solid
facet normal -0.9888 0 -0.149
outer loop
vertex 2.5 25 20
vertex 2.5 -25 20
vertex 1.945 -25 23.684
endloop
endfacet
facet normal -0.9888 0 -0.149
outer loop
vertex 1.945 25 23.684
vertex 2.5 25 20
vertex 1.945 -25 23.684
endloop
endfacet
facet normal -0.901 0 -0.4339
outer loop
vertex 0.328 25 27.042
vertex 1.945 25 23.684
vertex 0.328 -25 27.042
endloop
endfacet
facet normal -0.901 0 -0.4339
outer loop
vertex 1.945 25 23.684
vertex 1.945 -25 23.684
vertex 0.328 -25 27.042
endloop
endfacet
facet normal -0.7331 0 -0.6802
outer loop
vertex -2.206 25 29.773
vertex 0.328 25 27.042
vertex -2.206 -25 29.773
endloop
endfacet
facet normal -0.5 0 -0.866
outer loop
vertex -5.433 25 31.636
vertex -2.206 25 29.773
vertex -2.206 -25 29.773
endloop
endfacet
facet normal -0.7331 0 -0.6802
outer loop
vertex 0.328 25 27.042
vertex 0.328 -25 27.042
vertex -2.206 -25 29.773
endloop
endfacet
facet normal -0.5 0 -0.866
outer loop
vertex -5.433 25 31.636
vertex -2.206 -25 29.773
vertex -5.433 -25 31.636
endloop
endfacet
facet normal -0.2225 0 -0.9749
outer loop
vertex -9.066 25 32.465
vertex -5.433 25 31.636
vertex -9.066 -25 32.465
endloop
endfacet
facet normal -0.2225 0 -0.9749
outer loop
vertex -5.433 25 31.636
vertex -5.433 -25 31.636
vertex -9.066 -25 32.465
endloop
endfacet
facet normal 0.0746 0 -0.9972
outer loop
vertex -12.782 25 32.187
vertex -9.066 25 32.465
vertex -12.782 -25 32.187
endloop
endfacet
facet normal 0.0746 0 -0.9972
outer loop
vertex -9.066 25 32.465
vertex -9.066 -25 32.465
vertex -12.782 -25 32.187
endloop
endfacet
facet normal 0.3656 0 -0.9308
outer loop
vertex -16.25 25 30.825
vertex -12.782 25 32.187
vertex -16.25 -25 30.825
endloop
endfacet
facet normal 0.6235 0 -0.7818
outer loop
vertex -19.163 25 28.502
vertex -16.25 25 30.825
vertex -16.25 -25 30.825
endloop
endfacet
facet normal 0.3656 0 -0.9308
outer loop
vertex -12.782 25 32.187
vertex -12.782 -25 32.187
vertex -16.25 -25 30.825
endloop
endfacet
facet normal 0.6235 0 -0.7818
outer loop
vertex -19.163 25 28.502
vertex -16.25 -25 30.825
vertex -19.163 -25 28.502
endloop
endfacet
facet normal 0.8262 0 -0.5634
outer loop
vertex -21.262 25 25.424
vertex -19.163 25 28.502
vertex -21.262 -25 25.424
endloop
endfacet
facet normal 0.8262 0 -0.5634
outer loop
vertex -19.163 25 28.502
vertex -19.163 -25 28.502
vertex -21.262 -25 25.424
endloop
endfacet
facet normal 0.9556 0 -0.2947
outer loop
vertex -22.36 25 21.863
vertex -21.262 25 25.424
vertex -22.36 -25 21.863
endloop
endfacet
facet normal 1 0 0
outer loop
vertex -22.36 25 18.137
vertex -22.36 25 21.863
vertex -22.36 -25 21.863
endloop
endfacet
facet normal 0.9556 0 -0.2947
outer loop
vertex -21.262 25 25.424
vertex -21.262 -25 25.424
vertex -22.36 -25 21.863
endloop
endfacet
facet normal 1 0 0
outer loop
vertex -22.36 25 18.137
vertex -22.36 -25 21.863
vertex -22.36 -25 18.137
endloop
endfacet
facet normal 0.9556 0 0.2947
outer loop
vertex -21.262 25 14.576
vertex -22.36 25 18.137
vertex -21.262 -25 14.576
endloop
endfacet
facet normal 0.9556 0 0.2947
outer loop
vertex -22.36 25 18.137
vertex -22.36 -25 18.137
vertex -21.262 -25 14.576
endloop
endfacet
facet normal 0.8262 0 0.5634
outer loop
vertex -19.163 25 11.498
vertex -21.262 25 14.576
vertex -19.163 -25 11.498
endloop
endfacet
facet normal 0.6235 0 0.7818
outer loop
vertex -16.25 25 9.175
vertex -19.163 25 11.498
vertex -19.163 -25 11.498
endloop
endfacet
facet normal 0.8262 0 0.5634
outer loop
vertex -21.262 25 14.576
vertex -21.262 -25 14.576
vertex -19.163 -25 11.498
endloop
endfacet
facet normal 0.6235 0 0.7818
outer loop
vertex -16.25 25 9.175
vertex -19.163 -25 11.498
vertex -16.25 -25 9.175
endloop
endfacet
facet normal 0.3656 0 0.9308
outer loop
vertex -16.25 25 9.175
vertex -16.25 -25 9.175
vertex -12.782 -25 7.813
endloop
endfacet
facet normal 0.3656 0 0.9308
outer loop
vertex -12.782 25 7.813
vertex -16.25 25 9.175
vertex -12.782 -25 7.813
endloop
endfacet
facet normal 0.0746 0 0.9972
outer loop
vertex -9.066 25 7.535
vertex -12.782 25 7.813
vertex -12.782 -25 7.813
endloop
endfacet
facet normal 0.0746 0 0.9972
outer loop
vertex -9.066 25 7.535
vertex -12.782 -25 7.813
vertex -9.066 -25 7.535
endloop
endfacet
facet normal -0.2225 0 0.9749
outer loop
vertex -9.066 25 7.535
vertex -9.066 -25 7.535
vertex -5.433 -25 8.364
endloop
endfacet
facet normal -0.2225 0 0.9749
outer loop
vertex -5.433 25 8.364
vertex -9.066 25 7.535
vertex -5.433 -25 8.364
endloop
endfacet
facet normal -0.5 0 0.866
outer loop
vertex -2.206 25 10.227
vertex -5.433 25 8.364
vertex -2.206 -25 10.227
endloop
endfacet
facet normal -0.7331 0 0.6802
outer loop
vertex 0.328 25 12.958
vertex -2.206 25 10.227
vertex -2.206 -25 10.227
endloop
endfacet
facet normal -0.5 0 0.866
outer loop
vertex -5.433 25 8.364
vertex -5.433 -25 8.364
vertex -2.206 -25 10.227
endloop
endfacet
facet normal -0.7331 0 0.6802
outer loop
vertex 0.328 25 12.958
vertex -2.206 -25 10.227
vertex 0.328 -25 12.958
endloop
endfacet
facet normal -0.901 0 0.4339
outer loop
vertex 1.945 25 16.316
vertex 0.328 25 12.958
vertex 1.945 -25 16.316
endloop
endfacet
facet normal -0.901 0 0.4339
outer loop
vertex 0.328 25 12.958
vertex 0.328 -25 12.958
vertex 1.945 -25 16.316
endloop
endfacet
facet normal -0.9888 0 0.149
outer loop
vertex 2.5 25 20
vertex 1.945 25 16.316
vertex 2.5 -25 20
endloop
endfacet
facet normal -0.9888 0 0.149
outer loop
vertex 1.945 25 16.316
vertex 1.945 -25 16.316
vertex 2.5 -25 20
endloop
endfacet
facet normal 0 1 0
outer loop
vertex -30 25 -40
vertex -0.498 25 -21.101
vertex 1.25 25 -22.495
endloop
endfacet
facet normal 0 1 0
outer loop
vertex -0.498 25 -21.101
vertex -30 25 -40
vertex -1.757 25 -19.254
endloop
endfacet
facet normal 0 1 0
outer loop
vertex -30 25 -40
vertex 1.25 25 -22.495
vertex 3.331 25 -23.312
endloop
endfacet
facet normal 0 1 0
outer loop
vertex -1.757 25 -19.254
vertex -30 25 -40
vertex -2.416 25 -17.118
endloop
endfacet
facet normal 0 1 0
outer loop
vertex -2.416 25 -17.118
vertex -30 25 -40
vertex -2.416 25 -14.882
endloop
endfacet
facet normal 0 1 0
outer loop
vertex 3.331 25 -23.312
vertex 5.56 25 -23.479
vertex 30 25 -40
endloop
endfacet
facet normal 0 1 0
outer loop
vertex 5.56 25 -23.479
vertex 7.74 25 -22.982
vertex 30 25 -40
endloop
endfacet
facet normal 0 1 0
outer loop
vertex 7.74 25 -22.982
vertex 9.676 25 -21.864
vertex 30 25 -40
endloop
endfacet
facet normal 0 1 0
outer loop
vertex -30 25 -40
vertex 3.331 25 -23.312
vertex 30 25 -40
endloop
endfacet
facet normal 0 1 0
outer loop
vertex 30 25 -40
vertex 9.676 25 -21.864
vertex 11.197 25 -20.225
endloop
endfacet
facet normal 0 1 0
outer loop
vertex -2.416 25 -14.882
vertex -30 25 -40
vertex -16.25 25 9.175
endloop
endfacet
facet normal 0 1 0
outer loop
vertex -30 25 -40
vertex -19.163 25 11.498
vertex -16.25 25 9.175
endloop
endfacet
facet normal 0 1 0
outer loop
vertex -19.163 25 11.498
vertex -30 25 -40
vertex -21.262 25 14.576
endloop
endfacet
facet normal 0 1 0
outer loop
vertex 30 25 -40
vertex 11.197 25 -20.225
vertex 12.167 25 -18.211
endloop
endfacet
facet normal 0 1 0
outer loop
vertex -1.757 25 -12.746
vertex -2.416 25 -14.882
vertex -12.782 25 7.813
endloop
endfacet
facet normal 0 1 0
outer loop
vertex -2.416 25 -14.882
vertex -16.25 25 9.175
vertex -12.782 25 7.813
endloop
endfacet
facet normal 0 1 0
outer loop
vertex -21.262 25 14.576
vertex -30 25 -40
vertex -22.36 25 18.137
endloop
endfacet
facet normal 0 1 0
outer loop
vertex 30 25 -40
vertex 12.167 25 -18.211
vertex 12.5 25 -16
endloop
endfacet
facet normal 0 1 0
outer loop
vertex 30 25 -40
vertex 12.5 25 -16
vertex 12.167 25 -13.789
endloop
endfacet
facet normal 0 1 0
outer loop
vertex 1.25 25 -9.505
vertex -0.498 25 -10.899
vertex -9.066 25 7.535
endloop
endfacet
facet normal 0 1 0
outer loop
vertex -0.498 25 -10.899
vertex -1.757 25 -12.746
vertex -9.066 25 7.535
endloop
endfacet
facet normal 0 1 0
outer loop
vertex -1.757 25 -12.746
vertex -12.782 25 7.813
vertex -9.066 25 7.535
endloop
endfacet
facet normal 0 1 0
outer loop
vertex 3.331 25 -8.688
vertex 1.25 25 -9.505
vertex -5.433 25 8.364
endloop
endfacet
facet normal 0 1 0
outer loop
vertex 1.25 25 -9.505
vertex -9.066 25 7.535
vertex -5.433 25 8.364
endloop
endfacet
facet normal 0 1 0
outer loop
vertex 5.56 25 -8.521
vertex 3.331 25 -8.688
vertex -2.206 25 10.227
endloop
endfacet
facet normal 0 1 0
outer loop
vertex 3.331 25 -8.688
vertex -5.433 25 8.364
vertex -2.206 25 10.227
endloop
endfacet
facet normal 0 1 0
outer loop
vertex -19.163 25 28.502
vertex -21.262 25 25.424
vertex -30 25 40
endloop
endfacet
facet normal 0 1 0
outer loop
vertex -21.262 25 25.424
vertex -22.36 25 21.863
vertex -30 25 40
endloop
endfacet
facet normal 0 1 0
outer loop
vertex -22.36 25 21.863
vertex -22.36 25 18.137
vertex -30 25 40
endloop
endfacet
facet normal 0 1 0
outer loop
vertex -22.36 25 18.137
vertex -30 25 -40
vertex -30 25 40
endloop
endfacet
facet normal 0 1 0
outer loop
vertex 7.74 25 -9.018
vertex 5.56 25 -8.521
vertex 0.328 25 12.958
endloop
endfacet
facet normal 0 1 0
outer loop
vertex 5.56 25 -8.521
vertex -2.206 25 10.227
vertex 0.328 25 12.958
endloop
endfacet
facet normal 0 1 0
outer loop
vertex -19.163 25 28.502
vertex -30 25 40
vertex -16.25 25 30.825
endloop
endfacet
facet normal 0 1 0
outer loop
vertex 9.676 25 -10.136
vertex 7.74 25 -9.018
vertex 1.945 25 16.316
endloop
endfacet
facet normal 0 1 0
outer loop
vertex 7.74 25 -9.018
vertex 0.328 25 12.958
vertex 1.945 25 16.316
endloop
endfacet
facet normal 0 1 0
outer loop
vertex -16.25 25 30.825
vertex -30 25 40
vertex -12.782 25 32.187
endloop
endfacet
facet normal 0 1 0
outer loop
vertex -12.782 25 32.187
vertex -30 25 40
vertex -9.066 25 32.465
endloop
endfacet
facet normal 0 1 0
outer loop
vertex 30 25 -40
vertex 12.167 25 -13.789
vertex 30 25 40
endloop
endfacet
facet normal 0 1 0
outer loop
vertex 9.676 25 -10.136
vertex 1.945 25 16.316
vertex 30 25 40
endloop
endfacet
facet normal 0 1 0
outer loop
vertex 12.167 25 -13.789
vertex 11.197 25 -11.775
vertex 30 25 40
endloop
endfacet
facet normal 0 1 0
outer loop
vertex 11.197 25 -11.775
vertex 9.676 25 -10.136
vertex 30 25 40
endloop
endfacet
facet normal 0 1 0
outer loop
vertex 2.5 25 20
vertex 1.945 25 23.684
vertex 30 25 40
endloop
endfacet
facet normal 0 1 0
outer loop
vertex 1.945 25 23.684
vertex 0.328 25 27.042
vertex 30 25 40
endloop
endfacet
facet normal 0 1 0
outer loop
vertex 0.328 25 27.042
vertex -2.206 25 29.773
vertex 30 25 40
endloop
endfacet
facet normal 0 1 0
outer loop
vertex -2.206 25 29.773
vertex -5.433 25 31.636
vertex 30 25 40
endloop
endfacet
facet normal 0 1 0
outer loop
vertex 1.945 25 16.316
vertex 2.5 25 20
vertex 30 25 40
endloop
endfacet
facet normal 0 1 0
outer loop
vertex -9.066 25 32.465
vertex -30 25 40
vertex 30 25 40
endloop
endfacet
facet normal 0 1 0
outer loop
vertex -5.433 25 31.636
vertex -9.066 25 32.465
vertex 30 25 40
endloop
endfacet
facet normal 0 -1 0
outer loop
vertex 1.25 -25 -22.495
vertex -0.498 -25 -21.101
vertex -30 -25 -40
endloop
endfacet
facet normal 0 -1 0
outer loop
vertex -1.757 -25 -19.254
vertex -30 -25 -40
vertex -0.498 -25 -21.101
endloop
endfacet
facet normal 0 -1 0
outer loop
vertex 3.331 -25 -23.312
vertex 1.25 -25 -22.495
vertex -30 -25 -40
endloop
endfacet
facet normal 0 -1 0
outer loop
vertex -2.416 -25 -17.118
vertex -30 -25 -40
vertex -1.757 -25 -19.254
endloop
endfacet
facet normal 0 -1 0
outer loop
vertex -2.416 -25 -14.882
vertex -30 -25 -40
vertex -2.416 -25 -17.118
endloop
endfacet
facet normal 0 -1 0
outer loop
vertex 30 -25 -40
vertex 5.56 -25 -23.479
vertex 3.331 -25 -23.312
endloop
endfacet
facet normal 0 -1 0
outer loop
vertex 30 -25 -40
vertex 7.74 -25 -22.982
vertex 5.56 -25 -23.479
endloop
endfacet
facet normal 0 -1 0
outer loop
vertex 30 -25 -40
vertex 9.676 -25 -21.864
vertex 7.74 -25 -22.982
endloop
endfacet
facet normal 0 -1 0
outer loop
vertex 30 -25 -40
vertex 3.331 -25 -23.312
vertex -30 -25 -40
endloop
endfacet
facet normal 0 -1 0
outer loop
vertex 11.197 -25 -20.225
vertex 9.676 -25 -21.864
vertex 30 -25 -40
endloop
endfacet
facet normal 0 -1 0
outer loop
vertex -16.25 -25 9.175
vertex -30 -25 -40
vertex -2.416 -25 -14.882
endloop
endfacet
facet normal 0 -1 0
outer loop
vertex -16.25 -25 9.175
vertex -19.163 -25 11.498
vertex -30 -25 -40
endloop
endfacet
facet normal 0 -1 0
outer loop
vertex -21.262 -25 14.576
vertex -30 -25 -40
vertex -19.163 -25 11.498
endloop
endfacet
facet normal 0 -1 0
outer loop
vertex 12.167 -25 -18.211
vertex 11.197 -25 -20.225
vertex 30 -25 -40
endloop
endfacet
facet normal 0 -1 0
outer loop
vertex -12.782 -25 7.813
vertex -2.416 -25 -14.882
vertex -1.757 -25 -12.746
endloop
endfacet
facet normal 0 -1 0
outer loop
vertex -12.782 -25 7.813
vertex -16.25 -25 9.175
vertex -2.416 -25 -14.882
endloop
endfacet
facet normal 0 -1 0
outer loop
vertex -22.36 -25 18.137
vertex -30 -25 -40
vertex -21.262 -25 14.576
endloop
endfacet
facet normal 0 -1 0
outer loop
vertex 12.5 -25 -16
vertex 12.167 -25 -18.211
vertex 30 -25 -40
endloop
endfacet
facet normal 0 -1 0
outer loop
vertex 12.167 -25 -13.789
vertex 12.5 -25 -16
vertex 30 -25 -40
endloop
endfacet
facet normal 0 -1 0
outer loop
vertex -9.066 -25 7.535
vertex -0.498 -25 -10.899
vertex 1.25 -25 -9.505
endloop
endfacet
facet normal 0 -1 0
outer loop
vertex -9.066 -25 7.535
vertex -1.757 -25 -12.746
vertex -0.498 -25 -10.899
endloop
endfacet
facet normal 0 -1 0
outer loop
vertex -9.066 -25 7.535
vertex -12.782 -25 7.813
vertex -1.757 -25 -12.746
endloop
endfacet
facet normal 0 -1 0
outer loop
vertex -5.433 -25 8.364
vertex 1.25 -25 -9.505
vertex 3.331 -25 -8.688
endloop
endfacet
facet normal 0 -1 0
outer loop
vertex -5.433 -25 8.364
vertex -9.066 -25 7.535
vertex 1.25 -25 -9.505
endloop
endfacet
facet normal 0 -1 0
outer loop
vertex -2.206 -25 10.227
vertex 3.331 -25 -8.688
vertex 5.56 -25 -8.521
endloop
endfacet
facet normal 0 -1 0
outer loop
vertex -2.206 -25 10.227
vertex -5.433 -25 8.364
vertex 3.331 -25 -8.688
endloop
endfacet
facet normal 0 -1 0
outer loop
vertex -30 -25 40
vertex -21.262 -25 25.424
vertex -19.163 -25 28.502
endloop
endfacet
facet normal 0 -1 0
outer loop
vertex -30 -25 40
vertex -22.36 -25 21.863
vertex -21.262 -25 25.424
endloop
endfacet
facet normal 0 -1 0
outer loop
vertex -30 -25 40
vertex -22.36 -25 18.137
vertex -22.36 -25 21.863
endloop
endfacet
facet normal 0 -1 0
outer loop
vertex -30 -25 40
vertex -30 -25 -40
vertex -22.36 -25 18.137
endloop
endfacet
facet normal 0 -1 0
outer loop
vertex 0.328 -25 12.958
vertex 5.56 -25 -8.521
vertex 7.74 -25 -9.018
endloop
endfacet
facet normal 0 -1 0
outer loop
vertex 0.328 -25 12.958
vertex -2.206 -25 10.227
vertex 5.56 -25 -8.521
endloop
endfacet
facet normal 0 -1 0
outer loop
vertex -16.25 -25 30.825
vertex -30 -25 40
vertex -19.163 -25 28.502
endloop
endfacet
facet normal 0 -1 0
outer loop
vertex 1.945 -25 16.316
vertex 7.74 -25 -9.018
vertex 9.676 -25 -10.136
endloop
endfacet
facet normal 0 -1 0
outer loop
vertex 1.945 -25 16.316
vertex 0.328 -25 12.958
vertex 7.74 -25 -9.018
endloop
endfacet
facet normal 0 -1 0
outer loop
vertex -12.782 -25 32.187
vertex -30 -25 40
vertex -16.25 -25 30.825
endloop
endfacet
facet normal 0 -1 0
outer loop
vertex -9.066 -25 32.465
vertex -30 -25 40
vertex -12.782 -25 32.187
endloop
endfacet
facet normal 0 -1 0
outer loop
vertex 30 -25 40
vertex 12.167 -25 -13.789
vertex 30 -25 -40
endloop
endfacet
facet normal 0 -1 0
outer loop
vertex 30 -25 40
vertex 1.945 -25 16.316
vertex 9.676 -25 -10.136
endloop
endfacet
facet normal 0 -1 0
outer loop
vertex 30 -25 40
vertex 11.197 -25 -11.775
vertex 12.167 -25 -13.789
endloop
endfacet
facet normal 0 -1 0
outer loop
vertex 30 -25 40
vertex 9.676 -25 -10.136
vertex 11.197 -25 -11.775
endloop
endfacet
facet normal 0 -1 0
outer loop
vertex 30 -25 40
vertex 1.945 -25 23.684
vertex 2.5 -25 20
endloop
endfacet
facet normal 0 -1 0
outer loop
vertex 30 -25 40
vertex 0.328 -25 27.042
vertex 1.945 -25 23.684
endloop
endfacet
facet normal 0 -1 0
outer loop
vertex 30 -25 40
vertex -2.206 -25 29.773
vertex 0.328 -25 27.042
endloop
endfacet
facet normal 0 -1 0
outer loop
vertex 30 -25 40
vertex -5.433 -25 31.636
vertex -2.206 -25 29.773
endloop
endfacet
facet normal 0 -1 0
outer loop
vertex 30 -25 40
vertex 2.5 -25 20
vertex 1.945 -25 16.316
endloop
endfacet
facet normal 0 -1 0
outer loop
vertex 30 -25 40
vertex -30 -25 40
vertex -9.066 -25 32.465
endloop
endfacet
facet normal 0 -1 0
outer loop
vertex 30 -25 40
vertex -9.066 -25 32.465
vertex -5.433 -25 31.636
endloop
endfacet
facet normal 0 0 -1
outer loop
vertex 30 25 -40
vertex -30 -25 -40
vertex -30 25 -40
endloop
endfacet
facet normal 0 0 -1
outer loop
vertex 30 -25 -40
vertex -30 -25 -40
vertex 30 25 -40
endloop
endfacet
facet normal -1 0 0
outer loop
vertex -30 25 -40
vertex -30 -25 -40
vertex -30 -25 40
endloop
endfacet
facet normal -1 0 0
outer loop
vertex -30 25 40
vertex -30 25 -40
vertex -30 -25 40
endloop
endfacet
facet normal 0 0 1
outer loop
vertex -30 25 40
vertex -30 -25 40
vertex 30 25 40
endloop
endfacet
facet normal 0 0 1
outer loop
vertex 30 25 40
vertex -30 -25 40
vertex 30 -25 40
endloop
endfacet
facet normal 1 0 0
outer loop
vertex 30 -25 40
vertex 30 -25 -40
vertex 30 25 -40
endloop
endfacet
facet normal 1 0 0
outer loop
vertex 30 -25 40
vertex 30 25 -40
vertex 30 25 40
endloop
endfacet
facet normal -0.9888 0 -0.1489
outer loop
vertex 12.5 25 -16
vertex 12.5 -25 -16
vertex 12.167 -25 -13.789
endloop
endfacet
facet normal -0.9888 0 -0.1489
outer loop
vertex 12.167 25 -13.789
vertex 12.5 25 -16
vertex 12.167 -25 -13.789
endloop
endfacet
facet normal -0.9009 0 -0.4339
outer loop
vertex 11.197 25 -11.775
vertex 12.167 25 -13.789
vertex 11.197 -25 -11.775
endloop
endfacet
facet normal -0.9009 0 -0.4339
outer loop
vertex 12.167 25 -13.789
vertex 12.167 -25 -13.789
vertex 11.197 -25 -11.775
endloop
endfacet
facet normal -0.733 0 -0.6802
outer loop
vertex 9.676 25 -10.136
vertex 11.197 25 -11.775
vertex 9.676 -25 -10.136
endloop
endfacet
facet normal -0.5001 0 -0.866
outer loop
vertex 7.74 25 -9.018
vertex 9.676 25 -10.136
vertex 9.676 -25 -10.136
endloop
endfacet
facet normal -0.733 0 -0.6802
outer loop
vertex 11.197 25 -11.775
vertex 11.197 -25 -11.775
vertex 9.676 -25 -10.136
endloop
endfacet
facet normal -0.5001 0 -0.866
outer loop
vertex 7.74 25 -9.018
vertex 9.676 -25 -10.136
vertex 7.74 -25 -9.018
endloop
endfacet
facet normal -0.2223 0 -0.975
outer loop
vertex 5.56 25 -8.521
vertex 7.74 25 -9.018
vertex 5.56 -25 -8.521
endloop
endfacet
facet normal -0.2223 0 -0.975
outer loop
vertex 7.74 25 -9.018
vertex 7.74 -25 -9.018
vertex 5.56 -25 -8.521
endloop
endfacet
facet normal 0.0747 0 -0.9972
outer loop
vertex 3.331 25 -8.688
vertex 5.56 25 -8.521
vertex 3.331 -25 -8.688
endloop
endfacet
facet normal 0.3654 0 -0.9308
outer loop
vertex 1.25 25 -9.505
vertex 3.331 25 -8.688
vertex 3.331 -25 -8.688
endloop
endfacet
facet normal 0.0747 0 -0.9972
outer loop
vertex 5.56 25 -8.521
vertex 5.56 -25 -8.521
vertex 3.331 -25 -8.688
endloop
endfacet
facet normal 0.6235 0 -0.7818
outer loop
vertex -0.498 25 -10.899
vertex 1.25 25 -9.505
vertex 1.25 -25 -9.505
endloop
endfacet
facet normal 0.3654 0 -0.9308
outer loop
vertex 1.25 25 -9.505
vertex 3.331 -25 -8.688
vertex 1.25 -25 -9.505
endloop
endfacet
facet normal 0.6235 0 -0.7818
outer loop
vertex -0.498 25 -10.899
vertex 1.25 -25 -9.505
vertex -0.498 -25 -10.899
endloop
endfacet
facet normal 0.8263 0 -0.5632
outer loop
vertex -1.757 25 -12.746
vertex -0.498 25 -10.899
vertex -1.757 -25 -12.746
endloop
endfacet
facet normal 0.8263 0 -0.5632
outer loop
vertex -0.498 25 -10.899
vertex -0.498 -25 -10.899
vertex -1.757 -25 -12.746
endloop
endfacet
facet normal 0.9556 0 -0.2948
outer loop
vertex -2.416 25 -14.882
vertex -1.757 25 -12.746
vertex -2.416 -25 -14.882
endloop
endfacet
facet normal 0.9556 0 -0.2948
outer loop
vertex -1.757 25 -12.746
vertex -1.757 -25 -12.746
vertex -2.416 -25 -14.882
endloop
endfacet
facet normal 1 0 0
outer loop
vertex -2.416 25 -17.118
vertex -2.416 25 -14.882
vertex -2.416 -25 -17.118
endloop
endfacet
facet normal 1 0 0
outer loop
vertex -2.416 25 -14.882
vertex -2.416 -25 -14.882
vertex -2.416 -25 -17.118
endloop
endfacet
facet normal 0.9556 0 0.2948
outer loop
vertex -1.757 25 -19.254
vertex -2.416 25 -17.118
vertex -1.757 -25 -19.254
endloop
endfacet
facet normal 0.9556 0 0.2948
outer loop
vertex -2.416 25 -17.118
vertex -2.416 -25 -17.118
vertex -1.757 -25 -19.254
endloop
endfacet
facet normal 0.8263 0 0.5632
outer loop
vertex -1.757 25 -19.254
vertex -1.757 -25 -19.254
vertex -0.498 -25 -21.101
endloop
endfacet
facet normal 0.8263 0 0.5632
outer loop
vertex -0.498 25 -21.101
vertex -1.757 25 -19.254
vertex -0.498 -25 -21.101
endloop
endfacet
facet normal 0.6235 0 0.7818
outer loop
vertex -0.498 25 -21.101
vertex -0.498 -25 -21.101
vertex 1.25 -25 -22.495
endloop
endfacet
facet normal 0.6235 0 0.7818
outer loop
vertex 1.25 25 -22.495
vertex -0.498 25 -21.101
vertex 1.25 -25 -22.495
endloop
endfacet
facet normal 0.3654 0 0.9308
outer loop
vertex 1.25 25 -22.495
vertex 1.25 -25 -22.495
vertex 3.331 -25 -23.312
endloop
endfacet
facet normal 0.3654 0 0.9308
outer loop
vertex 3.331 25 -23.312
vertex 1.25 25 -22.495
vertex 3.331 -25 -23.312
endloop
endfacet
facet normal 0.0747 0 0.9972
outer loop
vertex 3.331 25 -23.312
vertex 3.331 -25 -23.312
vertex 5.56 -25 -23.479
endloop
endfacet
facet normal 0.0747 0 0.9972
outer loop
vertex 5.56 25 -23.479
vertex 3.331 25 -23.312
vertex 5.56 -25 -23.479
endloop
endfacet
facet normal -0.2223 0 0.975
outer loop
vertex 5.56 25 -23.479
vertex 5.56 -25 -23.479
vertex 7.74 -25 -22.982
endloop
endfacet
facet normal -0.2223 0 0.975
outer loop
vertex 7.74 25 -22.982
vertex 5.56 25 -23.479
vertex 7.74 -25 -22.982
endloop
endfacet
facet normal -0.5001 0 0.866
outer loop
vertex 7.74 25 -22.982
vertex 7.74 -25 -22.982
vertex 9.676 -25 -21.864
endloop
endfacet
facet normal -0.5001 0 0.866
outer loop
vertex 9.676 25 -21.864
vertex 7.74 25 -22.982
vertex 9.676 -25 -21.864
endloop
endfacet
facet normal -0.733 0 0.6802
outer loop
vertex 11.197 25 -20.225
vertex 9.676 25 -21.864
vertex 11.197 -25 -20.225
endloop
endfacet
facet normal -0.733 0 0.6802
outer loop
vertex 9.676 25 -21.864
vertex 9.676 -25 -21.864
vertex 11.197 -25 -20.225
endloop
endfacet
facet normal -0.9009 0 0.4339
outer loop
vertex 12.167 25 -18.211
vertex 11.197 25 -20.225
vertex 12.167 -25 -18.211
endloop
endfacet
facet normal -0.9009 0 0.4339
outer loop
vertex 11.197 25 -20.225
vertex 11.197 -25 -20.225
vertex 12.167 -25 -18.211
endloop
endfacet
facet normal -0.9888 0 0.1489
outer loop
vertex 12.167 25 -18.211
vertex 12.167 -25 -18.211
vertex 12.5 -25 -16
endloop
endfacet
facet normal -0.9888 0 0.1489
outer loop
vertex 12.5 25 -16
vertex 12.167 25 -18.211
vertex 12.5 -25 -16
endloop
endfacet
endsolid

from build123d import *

# Parameters (mm, degrees)
F0_W     = 60
F0_H     = 80
F1_DEPTH = 25
F2_R     = 12.5
F2_R_2   = 7.5
F3_DEPTH = 50


with BuildPart() as f1:
    # F0 (on Front) → F1 (new body, symmetric)
    with BuildSketch(Plane.XZ):
        Rectangle(F0_W, F0_H)
    extrude(amount=F1_DEPTH, both=True)

    # F2 (on face) → F3 (cut, through all)
    with BuildSketch(Plane.XZ.offset(25)):
        with Locations((-10, 20)):
            Circle(F2_R)
        with Locations((5, -16)):
            Circle(F2_R_2)
    extrude(amount=-F3_DEPTH, mode=Mode.SUBTRACT)


solid = f1.part
